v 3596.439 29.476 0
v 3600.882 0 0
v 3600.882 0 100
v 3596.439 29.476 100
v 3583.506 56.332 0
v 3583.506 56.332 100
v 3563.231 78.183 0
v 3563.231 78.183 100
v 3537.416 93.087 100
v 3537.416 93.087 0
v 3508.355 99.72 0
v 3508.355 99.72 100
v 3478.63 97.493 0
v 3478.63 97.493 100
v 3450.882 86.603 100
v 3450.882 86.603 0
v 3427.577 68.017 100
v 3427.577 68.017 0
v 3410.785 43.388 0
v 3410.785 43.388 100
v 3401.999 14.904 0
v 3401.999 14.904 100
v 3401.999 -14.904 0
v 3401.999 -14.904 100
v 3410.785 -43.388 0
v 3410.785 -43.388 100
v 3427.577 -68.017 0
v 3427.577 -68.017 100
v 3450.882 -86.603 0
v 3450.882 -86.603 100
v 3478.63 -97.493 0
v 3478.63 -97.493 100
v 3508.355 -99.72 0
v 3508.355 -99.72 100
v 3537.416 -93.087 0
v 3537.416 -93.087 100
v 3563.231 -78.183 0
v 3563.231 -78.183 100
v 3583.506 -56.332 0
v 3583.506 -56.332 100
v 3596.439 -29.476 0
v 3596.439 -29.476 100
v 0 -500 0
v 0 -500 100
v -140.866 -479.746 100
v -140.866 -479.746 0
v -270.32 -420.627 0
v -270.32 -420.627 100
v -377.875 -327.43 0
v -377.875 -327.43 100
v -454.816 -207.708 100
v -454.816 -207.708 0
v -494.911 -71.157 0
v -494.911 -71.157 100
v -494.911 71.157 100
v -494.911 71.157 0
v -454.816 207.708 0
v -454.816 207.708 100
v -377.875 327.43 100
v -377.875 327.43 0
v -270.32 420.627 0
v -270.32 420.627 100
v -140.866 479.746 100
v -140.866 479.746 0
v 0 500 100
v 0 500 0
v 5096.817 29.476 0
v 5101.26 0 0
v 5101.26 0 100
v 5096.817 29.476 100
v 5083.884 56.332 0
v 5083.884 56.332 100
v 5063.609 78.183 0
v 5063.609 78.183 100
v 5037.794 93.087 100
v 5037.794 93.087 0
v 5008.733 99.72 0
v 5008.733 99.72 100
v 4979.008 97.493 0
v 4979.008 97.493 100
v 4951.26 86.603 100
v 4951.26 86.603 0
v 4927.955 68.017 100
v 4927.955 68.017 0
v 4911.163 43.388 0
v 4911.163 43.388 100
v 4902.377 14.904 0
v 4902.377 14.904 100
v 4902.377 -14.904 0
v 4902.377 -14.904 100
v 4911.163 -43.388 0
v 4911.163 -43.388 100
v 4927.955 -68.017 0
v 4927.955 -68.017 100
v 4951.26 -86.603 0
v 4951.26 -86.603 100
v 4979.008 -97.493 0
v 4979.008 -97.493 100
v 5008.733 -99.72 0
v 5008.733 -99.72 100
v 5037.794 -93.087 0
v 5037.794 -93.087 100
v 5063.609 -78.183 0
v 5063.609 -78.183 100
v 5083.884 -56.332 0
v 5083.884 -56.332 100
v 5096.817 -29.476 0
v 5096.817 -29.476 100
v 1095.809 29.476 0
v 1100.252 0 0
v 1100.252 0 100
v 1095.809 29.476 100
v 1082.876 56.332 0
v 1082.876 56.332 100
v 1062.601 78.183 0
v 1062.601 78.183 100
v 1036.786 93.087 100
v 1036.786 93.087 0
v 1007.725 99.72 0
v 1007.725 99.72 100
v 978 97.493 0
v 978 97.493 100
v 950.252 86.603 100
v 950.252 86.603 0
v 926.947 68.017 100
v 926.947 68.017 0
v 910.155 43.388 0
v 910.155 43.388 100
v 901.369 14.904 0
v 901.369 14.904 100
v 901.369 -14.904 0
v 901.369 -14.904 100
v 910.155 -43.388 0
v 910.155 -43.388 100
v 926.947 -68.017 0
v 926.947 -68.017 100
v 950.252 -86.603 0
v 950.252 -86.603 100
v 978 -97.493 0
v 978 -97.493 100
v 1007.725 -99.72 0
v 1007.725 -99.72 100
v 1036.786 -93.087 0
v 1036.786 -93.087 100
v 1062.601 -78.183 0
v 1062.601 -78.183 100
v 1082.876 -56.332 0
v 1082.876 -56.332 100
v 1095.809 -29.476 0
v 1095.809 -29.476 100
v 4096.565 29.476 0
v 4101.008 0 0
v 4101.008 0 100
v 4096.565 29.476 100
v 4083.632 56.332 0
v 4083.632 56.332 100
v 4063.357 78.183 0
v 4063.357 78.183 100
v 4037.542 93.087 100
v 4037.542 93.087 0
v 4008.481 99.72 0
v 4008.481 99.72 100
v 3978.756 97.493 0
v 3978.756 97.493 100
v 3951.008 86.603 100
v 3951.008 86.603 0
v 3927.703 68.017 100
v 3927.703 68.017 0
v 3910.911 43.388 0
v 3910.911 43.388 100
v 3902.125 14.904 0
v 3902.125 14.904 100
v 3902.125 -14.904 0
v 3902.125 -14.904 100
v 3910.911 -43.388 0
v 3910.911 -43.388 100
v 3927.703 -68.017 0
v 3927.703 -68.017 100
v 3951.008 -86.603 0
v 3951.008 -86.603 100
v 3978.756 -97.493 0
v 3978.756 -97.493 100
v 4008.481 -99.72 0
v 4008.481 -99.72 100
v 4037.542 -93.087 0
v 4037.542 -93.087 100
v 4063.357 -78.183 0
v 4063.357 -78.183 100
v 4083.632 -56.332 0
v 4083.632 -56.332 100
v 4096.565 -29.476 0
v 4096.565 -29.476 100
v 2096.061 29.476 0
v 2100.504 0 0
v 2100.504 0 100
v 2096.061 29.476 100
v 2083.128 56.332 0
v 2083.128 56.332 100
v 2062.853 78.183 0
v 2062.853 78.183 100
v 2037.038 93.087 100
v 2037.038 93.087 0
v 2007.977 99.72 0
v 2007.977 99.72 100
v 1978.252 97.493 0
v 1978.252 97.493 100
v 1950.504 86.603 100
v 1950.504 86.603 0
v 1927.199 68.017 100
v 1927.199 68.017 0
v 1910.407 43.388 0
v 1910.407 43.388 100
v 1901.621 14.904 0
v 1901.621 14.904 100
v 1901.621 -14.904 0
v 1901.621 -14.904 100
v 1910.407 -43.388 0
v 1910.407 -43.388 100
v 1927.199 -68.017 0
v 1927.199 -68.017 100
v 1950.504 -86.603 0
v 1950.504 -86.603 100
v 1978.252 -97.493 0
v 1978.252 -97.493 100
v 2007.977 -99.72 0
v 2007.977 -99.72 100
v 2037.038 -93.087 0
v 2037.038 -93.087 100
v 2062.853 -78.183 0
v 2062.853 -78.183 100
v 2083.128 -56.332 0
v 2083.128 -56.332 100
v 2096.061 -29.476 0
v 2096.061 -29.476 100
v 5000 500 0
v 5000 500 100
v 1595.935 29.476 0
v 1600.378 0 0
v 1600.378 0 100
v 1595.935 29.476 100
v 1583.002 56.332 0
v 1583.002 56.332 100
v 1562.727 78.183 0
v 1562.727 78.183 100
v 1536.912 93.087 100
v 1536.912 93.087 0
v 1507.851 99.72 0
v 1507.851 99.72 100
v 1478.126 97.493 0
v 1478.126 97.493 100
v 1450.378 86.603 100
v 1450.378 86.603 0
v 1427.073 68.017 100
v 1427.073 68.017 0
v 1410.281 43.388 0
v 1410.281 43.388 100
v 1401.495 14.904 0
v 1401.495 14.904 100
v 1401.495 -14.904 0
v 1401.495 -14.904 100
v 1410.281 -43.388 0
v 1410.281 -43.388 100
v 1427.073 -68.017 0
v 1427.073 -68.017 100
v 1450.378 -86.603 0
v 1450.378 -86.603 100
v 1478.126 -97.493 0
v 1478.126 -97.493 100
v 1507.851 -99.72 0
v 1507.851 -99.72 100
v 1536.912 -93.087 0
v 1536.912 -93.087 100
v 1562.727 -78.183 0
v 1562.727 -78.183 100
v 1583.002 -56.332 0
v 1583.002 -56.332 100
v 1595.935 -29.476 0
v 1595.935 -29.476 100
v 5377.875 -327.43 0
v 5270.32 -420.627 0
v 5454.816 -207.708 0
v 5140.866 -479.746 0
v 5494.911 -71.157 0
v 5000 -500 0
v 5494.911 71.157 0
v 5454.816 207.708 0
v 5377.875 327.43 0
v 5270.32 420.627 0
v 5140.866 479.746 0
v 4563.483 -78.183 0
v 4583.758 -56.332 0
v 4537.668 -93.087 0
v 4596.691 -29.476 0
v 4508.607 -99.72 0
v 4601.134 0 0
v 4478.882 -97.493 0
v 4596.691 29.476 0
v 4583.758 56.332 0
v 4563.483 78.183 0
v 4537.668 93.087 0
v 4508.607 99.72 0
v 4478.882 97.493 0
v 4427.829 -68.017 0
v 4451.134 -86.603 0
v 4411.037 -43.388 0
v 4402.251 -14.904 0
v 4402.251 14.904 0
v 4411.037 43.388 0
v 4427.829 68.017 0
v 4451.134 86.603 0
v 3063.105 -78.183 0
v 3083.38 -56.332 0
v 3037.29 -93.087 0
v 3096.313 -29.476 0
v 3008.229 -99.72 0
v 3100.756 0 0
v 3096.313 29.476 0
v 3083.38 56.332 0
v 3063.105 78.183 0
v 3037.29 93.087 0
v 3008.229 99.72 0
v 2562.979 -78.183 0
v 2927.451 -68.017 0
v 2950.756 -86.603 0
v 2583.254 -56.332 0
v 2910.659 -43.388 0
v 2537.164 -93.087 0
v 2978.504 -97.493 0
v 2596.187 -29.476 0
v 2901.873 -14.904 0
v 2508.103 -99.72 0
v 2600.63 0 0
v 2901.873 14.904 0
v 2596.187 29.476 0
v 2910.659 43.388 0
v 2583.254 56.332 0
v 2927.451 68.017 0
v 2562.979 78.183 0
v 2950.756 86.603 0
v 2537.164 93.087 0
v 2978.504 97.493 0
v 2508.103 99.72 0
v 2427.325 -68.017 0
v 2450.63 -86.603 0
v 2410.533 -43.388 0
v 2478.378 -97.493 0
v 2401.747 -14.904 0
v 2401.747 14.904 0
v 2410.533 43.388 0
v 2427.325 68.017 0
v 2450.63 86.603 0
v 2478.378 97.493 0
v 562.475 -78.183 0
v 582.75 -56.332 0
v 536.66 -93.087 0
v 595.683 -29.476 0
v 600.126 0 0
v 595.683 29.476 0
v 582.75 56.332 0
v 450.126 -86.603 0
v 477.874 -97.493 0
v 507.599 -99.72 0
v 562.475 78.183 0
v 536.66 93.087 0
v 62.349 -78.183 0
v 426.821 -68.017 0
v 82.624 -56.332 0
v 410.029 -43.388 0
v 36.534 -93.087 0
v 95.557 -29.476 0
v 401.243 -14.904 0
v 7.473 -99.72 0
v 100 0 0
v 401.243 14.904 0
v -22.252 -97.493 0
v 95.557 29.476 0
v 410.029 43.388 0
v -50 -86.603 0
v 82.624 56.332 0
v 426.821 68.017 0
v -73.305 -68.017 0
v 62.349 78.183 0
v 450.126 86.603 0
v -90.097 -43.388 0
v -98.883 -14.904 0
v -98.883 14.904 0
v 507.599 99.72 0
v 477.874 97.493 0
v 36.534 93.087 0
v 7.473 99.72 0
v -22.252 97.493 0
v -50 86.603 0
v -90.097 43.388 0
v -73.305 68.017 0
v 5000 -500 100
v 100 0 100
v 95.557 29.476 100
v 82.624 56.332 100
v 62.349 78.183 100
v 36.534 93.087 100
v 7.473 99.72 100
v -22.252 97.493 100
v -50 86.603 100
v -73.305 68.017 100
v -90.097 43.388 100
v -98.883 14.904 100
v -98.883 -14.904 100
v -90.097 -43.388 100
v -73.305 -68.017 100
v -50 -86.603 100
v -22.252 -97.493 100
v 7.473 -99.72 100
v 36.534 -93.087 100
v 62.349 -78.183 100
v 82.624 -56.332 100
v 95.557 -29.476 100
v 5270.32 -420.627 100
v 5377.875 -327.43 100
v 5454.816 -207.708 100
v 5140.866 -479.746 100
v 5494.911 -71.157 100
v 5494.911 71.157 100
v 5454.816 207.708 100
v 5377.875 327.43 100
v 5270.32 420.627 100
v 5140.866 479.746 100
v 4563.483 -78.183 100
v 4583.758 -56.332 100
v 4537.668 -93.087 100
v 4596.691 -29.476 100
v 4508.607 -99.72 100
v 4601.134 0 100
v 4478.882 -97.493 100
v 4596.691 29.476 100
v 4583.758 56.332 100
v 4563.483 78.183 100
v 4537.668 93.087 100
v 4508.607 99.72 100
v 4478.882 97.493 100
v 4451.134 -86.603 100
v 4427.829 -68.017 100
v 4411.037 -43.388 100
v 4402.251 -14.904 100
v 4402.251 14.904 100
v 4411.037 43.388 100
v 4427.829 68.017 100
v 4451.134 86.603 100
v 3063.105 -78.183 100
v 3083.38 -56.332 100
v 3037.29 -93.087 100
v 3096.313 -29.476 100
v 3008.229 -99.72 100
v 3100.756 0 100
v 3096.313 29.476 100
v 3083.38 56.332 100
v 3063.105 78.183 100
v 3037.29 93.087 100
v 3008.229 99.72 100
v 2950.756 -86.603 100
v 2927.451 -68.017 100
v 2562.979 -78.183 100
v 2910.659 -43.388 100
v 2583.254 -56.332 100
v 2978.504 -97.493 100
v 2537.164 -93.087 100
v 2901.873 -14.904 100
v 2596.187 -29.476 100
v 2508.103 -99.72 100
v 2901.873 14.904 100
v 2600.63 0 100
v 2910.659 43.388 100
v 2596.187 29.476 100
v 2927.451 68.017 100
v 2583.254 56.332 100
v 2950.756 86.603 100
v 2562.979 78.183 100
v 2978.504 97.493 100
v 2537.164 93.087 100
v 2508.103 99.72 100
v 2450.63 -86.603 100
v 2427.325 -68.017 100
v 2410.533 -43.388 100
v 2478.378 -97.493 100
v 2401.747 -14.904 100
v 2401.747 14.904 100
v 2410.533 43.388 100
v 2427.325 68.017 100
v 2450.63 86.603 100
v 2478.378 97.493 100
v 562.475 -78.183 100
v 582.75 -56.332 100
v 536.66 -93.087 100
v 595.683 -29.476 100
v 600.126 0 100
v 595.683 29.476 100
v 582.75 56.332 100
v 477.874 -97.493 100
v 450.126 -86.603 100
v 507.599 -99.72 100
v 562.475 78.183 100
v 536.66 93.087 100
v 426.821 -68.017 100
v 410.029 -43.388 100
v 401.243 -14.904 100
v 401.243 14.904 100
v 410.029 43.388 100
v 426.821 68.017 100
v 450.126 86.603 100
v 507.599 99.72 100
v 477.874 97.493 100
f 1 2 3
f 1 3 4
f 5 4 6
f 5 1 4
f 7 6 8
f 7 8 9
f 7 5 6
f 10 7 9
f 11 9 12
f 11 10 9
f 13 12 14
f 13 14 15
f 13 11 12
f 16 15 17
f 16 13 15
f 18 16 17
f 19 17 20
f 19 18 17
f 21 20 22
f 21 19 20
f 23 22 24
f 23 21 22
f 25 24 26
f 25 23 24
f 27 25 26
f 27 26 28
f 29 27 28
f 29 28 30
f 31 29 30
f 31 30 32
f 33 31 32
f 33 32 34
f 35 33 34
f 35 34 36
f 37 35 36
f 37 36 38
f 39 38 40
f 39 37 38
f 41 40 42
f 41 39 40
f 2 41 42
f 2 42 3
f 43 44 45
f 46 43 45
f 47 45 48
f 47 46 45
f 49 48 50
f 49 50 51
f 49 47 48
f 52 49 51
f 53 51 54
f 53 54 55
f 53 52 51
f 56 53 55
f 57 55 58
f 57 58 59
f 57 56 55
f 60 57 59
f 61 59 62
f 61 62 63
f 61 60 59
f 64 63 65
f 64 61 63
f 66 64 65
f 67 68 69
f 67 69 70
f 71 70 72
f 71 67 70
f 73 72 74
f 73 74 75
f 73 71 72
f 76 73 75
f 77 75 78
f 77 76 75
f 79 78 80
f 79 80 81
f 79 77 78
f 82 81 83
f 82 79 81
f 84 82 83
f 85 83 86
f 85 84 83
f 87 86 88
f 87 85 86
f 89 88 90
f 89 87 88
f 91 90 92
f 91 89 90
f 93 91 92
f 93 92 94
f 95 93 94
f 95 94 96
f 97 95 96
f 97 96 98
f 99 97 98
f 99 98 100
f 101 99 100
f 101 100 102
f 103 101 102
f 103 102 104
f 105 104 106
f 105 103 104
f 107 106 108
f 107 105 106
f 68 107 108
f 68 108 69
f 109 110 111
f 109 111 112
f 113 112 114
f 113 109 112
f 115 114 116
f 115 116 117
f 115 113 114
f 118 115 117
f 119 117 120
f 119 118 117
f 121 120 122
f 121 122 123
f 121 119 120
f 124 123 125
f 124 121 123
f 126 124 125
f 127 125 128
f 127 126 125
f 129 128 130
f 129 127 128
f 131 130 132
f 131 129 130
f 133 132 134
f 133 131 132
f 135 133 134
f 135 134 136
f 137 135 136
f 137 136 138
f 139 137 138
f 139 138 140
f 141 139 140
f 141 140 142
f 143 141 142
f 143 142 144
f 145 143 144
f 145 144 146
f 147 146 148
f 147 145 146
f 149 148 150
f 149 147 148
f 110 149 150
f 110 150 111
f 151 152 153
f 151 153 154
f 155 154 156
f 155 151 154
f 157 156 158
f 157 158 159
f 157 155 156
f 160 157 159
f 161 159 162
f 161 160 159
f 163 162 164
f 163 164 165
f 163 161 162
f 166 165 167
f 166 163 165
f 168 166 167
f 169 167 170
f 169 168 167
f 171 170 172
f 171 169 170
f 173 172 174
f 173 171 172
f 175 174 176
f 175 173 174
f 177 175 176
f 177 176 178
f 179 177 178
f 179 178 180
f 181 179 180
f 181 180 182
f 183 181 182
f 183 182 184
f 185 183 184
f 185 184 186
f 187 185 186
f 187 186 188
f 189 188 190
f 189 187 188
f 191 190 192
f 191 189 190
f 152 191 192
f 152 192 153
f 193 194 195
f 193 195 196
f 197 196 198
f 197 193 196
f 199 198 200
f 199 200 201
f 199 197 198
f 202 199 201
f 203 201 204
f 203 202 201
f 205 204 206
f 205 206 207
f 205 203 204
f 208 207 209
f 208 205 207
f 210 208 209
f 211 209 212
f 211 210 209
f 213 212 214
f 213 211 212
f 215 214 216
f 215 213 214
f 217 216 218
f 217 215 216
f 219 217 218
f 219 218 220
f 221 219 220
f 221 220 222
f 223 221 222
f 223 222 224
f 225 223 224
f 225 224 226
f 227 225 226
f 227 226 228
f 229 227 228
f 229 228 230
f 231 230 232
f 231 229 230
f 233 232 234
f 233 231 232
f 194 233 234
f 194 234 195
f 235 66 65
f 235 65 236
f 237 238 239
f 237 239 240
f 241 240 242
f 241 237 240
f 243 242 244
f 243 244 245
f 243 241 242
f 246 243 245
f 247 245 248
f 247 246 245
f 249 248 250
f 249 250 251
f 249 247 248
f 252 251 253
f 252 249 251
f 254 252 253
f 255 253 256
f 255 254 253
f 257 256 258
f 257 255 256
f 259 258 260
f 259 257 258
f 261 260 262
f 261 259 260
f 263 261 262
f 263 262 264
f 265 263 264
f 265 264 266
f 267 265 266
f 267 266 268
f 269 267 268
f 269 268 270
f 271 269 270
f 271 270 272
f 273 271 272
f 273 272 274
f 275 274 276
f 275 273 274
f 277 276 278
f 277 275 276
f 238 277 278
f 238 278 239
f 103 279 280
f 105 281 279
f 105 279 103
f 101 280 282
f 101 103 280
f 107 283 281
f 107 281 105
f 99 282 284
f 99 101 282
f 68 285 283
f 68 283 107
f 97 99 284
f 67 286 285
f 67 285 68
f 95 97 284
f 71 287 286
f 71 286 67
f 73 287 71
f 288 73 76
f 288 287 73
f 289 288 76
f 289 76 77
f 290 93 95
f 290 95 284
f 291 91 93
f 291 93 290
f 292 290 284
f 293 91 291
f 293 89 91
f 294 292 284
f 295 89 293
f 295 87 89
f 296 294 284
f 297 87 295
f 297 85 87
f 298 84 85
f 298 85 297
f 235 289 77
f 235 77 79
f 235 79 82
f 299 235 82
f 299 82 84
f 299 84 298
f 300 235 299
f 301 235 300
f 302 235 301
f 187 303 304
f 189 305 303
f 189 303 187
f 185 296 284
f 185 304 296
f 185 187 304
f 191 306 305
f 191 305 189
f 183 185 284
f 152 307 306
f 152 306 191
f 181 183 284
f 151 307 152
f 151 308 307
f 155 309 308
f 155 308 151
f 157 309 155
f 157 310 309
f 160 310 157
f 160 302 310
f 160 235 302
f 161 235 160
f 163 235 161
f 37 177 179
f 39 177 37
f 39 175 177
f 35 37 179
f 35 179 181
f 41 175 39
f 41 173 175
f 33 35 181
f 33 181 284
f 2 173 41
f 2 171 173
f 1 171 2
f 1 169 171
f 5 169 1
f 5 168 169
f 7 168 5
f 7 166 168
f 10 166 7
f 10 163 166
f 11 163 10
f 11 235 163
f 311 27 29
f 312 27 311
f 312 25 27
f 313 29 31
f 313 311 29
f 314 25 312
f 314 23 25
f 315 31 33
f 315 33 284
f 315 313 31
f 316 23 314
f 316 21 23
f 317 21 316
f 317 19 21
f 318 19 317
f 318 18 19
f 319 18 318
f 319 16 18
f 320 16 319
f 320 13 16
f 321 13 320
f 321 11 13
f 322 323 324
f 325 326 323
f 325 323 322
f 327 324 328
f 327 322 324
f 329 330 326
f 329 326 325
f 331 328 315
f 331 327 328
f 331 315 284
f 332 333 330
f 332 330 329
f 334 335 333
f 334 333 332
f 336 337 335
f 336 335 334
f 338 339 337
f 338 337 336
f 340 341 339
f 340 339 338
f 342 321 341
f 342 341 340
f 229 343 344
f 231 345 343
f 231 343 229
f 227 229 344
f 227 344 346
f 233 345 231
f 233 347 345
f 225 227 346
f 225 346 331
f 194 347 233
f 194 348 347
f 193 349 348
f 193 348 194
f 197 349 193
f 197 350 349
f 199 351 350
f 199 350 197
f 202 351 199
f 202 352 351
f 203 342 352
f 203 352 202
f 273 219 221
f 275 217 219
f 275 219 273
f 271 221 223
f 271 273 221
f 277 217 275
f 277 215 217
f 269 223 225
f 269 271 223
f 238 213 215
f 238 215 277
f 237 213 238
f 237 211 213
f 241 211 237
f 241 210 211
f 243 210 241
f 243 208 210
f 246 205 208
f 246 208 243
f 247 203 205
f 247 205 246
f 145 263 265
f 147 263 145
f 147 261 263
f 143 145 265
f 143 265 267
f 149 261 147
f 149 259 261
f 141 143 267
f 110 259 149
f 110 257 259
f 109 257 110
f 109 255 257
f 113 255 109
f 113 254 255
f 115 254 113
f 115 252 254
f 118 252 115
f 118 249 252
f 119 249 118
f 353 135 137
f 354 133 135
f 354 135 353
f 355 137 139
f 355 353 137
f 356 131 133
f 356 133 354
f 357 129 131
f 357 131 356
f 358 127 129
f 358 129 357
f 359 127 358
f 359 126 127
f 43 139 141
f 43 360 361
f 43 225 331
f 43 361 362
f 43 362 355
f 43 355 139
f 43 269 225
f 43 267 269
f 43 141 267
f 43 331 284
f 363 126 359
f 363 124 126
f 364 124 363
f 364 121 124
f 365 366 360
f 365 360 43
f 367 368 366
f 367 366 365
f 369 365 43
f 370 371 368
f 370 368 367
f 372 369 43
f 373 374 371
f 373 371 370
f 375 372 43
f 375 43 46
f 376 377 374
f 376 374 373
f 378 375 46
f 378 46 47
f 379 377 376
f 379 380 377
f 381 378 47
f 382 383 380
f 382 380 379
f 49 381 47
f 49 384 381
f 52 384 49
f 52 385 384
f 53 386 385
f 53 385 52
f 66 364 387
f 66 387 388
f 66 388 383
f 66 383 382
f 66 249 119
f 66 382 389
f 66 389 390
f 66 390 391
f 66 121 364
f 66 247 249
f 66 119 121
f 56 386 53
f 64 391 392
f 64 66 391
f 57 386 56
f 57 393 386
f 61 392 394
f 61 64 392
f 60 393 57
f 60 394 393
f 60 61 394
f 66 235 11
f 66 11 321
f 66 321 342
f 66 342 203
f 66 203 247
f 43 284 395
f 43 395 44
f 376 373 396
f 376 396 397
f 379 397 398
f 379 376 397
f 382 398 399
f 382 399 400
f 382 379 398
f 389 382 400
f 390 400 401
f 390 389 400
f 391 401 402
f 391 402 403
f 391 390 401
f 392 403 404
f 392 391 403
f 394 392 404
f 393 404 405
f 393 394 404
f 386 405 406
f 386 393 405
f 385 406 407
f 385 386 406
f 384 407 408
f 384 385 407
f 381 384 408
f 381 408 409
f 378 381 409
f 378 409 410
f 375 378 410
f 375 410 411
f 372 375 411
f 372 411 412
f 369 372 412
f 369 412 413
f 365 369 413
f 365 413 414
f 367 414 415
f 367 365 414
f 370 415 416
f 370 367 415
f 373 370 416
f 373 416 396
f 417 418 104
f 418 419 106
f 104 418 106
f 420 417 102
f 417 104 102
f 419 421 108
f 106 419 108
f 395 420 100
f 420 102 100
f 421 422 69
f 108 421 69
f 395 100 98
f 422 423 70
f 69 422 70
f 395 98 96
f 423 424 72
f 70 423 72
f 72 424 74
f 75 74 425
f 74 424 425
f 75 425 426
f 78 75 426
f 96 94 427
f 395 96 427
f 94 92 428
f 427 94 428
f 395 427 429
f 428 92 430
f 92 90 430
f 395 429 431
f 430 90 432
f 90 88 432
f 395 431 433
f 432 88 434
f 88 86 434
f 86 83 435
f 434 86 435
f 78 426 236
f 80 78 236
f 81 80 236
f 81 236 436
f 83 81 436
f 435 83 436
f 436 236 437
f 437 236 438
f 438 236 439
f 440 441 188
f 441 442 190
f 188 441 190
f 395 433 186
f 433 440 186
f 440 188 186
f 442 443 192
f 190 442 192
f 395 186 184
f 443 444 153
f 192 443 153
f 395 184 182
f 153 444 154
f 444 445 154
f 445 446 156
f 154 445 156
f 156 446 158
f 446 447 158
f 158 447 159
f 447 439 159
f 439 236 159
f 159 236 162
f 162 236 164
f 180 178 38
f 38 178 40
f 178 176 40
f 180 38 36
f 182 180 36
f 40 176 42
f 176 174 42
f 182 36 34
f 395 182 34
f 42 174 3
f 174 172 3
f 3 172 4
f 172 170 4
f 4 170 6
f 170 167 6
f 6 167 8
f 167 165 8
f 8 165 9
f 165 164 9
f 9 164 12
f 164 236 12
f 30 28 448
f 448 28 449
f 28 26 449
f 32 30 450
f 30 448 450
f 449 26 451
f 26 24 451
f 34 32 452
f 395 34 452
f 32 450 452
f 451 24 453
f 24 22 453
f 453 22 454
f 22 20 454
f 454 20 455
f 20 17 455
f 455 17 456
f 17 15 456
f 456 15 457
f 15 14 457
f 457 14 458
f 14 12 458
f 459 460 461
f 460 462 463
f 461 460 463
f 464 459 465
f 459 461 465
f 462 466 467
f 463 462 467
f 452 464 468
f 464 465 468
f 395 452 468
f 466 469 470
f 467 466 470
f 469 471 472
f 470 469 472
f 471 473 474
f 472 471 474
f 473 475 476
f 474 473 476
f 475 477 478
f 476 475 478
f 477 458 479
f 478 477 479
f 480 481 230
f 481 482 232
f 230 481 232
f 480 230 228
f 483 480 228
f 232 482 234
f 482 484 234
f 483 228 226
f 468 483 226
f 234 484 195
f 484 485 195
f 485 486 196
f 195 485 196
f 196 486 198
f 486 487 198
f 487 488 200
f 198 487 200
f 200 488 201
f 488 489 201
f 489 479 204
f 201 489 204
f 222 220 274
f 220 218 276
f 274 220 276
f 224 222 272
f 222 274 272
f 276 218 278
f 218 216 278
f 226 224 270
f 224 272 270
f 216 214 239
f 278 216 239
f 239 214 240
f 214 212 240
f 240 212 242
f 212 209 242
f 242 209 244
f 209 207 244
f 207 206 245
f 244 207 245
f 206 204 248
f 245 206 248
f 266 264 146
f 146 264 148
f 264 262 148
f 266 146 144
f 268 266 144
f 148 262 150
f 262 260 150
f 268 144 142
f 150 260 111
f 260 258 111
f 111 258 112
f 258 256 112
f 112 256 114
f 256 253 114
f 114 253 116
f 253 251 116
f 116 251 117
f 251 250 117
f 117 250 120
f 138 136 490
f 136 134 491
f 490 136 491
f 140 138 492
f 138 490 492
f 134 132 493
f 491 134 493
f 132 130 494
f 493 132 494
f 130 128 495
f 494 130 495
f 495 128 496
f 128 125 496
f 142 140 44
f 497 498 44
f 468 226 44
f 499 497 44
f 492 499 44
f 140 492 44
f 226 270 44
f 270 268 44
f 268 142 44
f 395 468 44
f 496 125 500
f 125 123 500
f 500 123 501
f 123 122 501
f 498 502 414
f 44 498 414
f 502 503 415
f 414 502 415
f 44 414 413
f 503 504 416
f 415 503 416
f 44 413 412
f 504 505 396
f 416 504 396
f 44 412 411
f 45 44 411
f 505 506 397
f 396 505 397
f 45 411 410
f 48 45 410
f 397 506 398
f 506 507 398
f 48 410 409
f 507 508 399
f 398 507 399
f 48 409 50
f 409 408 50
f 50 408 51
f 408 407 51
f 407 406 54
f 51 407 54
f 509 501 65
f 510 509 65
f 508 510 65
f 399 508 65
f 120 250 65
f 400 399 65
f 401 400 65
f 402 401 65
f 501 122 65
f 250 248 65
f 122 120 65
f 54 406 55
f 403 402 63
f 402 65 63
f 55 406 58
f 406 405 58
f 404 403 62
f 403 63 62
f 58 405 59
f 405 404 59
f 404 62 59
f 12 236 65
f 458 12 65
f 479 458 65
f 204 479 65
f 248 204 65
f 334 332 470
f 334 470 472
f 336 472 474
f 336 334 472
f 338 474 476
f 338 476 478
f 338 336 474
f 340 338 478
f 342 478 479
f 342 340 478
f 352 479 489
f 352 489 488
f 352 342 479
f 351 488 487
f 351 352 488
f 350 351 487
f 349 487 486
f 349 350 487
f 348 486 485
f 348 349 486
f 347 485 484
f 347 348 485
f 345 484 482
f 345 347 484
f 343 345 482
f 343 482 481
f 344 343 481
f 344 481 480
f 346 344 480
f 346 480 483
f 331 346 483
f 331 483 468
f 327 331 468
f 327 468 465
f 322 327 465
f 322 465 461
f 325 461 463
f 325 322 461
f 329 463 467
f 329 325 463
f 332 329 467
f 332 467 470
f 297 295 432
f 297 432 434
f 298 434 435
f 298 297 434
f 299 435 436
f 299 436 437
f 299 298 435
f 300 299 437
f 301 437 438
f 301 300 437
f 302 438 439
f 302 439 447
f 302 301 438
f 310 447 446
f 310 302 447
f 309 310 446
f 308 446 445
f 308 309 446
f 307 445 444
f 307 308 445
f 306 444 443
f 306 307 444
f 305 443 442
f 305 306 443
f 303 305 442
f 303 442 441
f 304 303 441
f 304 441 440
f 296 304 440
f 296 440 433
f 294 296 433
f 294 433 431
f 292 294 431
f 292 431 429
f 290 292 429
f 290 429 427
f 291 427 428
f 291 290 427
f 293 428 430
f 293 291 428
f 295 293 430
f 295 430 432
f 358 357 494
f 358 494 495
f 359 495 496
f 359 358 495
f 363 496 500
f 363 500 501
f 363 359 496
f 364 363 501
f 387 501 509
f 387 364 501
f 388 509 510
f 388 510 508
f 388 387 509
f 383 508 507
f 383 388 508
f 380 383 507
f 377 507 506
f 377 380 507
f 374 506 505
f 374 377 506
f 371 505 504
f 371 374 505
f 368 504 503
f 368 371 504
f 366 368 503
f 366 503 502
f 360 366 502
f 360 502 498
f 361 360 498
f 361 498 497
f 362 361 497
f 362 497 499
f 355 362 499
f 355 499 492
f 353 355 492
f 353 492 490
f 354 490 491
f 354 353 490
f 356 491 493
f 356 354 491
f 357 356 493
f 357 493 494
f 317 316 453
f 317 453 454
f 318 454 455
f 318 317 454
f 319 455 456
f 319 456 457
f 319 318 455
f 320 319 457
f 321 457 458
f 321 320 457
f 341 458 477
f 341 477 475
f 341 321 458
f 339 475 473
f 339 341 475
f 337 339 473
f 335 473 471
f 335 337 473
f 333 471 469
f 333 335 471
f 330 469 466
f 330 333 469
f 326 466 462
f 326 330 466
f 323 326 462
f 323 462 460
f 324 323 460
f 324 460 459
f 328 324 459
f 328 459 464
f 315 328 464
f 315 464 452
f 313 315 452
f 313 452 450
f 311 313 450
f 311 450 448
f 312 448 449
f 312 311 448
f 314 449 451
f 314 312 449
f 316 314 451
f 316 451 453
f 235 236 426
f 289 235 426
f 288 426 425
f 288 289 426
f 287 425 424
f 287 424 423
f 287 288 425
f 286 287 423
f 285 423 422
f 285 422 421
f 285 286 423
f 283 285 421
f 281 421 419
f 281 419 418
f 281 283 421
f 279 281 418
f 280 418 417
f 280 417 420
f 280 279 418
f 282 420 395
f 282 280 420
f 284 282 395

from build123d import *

# Parameters (mm, degrees)
SKETCH2_R           = 100
BOSS_EXTRUDE2_DEPTH = 100


with BuildPart() as part:
    # Sketch2 → Boss-Extrude2 (new body)
    with BuildSketch(Plane.XY):
        with BuildLine():
            Line((0, 500), (5000, 500))
            ThreePointArc((5000, 500), (5500, 0), (5000, -500))
            Line((5000, -500), (0, -500))
            ThreePointArc((0, -500), (-500, 0), (0, 500))
        make_face()
        Circle(SKETCH2_R, mode=Mode.SUBTRACT)
        with Locations((500.126, 0)):
            Circle(SKETCH2_R, mode=Mode.SUBTRACT)
        with Locations((1000.252, 0)):
            Circle(SKETCH2_R, mode=Mode.SUBTRACT)
        with Locations((1500.378, 0)):
            Circle(SKETCH2_R, mode=Mode.SUBTRACT)
        with Locations((2000.504, 0)):
            Circle(SKETCH2_R, mode=Mode.SUBTRACT)
        with Locations((2500.63, 0)):
            Circle(SKETCH2_R, mode=Mode.SUBTRACT)
        with Locations((3000.756, 0)):
            Circle(SKETCH2_R, mode=Mode.SUBTRACT)
        with Locations((3500.882, 0)):
            Circle(SKETCH2_R, mode=Mode.SUBTRACT)
        with Locations((4001.008, 0)):
            Circle(SKETCH2_R, mode=Mode.SUBTRACT)
        with Locations((4501.134, 0)):
            Circle(SKETCH2_R, mode=Mode.SUBTRACT)
        with Locations((5001.26, 0)):
            Circle(SKETCH2_R, mode=Mode.SUBTRACT)
    extrude(amount=BOSS_EXTRUDE2_DEPTH)


solid = part.part
